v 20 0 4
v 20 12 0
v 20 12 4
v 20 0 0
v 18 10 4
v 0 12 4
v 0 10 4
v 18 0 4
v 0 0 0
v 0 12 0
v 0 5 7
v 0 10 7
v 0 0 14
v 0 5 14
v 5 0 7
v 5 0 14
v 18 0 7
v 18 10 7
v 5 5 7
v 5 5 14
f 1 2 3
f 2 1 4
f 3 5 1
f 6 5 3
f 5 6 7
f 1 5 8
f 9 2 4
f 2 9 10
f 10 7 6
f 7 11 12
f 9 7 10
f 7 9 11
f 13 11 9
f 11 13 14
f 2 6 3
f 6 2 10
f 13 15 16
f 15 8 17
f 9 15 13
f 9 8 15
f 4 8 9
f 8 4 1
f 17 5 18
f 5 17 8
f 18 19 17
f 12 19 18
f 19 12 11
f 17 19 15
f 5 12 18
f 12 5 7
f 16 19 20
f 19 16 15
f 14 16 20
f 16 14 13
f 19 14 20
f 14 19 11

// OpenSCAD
/* [Part] */
// Select an individual printable part or an assembled view.
part = "assembly"; // [assembly:Assembly, base:Base, cap:Cap, peg:Peg]

/* [Dimensions] */
// Width of the base in millimeters.
base_width = 20; // [8:1:40]
cap_thickness = 3; // [1:1:8]
with_peg = true;
label_text = "Fixture";
offset = [0, 0, 0];

/* [Hidden] */
internal_dimension = 100;
$fn = 12;

module base() {
    cube([base_width, 12, 4]);
}
module cap() {
    cube([base_width - 2, 10, cap_thickness]);
}
module peg() {
    cube([5, 5, 7]);
}

translate(offset) {
    if (part == "base") base();
    else if (part == "cap") cap();
    else if (part == "peg") peg();
    else if (part == "assembly") {
        base();
        translate([0, 0, 4]) cap();
        if (with_peg) translate([0, 0, 4 + cap_thickness]) peg();
    }
}
